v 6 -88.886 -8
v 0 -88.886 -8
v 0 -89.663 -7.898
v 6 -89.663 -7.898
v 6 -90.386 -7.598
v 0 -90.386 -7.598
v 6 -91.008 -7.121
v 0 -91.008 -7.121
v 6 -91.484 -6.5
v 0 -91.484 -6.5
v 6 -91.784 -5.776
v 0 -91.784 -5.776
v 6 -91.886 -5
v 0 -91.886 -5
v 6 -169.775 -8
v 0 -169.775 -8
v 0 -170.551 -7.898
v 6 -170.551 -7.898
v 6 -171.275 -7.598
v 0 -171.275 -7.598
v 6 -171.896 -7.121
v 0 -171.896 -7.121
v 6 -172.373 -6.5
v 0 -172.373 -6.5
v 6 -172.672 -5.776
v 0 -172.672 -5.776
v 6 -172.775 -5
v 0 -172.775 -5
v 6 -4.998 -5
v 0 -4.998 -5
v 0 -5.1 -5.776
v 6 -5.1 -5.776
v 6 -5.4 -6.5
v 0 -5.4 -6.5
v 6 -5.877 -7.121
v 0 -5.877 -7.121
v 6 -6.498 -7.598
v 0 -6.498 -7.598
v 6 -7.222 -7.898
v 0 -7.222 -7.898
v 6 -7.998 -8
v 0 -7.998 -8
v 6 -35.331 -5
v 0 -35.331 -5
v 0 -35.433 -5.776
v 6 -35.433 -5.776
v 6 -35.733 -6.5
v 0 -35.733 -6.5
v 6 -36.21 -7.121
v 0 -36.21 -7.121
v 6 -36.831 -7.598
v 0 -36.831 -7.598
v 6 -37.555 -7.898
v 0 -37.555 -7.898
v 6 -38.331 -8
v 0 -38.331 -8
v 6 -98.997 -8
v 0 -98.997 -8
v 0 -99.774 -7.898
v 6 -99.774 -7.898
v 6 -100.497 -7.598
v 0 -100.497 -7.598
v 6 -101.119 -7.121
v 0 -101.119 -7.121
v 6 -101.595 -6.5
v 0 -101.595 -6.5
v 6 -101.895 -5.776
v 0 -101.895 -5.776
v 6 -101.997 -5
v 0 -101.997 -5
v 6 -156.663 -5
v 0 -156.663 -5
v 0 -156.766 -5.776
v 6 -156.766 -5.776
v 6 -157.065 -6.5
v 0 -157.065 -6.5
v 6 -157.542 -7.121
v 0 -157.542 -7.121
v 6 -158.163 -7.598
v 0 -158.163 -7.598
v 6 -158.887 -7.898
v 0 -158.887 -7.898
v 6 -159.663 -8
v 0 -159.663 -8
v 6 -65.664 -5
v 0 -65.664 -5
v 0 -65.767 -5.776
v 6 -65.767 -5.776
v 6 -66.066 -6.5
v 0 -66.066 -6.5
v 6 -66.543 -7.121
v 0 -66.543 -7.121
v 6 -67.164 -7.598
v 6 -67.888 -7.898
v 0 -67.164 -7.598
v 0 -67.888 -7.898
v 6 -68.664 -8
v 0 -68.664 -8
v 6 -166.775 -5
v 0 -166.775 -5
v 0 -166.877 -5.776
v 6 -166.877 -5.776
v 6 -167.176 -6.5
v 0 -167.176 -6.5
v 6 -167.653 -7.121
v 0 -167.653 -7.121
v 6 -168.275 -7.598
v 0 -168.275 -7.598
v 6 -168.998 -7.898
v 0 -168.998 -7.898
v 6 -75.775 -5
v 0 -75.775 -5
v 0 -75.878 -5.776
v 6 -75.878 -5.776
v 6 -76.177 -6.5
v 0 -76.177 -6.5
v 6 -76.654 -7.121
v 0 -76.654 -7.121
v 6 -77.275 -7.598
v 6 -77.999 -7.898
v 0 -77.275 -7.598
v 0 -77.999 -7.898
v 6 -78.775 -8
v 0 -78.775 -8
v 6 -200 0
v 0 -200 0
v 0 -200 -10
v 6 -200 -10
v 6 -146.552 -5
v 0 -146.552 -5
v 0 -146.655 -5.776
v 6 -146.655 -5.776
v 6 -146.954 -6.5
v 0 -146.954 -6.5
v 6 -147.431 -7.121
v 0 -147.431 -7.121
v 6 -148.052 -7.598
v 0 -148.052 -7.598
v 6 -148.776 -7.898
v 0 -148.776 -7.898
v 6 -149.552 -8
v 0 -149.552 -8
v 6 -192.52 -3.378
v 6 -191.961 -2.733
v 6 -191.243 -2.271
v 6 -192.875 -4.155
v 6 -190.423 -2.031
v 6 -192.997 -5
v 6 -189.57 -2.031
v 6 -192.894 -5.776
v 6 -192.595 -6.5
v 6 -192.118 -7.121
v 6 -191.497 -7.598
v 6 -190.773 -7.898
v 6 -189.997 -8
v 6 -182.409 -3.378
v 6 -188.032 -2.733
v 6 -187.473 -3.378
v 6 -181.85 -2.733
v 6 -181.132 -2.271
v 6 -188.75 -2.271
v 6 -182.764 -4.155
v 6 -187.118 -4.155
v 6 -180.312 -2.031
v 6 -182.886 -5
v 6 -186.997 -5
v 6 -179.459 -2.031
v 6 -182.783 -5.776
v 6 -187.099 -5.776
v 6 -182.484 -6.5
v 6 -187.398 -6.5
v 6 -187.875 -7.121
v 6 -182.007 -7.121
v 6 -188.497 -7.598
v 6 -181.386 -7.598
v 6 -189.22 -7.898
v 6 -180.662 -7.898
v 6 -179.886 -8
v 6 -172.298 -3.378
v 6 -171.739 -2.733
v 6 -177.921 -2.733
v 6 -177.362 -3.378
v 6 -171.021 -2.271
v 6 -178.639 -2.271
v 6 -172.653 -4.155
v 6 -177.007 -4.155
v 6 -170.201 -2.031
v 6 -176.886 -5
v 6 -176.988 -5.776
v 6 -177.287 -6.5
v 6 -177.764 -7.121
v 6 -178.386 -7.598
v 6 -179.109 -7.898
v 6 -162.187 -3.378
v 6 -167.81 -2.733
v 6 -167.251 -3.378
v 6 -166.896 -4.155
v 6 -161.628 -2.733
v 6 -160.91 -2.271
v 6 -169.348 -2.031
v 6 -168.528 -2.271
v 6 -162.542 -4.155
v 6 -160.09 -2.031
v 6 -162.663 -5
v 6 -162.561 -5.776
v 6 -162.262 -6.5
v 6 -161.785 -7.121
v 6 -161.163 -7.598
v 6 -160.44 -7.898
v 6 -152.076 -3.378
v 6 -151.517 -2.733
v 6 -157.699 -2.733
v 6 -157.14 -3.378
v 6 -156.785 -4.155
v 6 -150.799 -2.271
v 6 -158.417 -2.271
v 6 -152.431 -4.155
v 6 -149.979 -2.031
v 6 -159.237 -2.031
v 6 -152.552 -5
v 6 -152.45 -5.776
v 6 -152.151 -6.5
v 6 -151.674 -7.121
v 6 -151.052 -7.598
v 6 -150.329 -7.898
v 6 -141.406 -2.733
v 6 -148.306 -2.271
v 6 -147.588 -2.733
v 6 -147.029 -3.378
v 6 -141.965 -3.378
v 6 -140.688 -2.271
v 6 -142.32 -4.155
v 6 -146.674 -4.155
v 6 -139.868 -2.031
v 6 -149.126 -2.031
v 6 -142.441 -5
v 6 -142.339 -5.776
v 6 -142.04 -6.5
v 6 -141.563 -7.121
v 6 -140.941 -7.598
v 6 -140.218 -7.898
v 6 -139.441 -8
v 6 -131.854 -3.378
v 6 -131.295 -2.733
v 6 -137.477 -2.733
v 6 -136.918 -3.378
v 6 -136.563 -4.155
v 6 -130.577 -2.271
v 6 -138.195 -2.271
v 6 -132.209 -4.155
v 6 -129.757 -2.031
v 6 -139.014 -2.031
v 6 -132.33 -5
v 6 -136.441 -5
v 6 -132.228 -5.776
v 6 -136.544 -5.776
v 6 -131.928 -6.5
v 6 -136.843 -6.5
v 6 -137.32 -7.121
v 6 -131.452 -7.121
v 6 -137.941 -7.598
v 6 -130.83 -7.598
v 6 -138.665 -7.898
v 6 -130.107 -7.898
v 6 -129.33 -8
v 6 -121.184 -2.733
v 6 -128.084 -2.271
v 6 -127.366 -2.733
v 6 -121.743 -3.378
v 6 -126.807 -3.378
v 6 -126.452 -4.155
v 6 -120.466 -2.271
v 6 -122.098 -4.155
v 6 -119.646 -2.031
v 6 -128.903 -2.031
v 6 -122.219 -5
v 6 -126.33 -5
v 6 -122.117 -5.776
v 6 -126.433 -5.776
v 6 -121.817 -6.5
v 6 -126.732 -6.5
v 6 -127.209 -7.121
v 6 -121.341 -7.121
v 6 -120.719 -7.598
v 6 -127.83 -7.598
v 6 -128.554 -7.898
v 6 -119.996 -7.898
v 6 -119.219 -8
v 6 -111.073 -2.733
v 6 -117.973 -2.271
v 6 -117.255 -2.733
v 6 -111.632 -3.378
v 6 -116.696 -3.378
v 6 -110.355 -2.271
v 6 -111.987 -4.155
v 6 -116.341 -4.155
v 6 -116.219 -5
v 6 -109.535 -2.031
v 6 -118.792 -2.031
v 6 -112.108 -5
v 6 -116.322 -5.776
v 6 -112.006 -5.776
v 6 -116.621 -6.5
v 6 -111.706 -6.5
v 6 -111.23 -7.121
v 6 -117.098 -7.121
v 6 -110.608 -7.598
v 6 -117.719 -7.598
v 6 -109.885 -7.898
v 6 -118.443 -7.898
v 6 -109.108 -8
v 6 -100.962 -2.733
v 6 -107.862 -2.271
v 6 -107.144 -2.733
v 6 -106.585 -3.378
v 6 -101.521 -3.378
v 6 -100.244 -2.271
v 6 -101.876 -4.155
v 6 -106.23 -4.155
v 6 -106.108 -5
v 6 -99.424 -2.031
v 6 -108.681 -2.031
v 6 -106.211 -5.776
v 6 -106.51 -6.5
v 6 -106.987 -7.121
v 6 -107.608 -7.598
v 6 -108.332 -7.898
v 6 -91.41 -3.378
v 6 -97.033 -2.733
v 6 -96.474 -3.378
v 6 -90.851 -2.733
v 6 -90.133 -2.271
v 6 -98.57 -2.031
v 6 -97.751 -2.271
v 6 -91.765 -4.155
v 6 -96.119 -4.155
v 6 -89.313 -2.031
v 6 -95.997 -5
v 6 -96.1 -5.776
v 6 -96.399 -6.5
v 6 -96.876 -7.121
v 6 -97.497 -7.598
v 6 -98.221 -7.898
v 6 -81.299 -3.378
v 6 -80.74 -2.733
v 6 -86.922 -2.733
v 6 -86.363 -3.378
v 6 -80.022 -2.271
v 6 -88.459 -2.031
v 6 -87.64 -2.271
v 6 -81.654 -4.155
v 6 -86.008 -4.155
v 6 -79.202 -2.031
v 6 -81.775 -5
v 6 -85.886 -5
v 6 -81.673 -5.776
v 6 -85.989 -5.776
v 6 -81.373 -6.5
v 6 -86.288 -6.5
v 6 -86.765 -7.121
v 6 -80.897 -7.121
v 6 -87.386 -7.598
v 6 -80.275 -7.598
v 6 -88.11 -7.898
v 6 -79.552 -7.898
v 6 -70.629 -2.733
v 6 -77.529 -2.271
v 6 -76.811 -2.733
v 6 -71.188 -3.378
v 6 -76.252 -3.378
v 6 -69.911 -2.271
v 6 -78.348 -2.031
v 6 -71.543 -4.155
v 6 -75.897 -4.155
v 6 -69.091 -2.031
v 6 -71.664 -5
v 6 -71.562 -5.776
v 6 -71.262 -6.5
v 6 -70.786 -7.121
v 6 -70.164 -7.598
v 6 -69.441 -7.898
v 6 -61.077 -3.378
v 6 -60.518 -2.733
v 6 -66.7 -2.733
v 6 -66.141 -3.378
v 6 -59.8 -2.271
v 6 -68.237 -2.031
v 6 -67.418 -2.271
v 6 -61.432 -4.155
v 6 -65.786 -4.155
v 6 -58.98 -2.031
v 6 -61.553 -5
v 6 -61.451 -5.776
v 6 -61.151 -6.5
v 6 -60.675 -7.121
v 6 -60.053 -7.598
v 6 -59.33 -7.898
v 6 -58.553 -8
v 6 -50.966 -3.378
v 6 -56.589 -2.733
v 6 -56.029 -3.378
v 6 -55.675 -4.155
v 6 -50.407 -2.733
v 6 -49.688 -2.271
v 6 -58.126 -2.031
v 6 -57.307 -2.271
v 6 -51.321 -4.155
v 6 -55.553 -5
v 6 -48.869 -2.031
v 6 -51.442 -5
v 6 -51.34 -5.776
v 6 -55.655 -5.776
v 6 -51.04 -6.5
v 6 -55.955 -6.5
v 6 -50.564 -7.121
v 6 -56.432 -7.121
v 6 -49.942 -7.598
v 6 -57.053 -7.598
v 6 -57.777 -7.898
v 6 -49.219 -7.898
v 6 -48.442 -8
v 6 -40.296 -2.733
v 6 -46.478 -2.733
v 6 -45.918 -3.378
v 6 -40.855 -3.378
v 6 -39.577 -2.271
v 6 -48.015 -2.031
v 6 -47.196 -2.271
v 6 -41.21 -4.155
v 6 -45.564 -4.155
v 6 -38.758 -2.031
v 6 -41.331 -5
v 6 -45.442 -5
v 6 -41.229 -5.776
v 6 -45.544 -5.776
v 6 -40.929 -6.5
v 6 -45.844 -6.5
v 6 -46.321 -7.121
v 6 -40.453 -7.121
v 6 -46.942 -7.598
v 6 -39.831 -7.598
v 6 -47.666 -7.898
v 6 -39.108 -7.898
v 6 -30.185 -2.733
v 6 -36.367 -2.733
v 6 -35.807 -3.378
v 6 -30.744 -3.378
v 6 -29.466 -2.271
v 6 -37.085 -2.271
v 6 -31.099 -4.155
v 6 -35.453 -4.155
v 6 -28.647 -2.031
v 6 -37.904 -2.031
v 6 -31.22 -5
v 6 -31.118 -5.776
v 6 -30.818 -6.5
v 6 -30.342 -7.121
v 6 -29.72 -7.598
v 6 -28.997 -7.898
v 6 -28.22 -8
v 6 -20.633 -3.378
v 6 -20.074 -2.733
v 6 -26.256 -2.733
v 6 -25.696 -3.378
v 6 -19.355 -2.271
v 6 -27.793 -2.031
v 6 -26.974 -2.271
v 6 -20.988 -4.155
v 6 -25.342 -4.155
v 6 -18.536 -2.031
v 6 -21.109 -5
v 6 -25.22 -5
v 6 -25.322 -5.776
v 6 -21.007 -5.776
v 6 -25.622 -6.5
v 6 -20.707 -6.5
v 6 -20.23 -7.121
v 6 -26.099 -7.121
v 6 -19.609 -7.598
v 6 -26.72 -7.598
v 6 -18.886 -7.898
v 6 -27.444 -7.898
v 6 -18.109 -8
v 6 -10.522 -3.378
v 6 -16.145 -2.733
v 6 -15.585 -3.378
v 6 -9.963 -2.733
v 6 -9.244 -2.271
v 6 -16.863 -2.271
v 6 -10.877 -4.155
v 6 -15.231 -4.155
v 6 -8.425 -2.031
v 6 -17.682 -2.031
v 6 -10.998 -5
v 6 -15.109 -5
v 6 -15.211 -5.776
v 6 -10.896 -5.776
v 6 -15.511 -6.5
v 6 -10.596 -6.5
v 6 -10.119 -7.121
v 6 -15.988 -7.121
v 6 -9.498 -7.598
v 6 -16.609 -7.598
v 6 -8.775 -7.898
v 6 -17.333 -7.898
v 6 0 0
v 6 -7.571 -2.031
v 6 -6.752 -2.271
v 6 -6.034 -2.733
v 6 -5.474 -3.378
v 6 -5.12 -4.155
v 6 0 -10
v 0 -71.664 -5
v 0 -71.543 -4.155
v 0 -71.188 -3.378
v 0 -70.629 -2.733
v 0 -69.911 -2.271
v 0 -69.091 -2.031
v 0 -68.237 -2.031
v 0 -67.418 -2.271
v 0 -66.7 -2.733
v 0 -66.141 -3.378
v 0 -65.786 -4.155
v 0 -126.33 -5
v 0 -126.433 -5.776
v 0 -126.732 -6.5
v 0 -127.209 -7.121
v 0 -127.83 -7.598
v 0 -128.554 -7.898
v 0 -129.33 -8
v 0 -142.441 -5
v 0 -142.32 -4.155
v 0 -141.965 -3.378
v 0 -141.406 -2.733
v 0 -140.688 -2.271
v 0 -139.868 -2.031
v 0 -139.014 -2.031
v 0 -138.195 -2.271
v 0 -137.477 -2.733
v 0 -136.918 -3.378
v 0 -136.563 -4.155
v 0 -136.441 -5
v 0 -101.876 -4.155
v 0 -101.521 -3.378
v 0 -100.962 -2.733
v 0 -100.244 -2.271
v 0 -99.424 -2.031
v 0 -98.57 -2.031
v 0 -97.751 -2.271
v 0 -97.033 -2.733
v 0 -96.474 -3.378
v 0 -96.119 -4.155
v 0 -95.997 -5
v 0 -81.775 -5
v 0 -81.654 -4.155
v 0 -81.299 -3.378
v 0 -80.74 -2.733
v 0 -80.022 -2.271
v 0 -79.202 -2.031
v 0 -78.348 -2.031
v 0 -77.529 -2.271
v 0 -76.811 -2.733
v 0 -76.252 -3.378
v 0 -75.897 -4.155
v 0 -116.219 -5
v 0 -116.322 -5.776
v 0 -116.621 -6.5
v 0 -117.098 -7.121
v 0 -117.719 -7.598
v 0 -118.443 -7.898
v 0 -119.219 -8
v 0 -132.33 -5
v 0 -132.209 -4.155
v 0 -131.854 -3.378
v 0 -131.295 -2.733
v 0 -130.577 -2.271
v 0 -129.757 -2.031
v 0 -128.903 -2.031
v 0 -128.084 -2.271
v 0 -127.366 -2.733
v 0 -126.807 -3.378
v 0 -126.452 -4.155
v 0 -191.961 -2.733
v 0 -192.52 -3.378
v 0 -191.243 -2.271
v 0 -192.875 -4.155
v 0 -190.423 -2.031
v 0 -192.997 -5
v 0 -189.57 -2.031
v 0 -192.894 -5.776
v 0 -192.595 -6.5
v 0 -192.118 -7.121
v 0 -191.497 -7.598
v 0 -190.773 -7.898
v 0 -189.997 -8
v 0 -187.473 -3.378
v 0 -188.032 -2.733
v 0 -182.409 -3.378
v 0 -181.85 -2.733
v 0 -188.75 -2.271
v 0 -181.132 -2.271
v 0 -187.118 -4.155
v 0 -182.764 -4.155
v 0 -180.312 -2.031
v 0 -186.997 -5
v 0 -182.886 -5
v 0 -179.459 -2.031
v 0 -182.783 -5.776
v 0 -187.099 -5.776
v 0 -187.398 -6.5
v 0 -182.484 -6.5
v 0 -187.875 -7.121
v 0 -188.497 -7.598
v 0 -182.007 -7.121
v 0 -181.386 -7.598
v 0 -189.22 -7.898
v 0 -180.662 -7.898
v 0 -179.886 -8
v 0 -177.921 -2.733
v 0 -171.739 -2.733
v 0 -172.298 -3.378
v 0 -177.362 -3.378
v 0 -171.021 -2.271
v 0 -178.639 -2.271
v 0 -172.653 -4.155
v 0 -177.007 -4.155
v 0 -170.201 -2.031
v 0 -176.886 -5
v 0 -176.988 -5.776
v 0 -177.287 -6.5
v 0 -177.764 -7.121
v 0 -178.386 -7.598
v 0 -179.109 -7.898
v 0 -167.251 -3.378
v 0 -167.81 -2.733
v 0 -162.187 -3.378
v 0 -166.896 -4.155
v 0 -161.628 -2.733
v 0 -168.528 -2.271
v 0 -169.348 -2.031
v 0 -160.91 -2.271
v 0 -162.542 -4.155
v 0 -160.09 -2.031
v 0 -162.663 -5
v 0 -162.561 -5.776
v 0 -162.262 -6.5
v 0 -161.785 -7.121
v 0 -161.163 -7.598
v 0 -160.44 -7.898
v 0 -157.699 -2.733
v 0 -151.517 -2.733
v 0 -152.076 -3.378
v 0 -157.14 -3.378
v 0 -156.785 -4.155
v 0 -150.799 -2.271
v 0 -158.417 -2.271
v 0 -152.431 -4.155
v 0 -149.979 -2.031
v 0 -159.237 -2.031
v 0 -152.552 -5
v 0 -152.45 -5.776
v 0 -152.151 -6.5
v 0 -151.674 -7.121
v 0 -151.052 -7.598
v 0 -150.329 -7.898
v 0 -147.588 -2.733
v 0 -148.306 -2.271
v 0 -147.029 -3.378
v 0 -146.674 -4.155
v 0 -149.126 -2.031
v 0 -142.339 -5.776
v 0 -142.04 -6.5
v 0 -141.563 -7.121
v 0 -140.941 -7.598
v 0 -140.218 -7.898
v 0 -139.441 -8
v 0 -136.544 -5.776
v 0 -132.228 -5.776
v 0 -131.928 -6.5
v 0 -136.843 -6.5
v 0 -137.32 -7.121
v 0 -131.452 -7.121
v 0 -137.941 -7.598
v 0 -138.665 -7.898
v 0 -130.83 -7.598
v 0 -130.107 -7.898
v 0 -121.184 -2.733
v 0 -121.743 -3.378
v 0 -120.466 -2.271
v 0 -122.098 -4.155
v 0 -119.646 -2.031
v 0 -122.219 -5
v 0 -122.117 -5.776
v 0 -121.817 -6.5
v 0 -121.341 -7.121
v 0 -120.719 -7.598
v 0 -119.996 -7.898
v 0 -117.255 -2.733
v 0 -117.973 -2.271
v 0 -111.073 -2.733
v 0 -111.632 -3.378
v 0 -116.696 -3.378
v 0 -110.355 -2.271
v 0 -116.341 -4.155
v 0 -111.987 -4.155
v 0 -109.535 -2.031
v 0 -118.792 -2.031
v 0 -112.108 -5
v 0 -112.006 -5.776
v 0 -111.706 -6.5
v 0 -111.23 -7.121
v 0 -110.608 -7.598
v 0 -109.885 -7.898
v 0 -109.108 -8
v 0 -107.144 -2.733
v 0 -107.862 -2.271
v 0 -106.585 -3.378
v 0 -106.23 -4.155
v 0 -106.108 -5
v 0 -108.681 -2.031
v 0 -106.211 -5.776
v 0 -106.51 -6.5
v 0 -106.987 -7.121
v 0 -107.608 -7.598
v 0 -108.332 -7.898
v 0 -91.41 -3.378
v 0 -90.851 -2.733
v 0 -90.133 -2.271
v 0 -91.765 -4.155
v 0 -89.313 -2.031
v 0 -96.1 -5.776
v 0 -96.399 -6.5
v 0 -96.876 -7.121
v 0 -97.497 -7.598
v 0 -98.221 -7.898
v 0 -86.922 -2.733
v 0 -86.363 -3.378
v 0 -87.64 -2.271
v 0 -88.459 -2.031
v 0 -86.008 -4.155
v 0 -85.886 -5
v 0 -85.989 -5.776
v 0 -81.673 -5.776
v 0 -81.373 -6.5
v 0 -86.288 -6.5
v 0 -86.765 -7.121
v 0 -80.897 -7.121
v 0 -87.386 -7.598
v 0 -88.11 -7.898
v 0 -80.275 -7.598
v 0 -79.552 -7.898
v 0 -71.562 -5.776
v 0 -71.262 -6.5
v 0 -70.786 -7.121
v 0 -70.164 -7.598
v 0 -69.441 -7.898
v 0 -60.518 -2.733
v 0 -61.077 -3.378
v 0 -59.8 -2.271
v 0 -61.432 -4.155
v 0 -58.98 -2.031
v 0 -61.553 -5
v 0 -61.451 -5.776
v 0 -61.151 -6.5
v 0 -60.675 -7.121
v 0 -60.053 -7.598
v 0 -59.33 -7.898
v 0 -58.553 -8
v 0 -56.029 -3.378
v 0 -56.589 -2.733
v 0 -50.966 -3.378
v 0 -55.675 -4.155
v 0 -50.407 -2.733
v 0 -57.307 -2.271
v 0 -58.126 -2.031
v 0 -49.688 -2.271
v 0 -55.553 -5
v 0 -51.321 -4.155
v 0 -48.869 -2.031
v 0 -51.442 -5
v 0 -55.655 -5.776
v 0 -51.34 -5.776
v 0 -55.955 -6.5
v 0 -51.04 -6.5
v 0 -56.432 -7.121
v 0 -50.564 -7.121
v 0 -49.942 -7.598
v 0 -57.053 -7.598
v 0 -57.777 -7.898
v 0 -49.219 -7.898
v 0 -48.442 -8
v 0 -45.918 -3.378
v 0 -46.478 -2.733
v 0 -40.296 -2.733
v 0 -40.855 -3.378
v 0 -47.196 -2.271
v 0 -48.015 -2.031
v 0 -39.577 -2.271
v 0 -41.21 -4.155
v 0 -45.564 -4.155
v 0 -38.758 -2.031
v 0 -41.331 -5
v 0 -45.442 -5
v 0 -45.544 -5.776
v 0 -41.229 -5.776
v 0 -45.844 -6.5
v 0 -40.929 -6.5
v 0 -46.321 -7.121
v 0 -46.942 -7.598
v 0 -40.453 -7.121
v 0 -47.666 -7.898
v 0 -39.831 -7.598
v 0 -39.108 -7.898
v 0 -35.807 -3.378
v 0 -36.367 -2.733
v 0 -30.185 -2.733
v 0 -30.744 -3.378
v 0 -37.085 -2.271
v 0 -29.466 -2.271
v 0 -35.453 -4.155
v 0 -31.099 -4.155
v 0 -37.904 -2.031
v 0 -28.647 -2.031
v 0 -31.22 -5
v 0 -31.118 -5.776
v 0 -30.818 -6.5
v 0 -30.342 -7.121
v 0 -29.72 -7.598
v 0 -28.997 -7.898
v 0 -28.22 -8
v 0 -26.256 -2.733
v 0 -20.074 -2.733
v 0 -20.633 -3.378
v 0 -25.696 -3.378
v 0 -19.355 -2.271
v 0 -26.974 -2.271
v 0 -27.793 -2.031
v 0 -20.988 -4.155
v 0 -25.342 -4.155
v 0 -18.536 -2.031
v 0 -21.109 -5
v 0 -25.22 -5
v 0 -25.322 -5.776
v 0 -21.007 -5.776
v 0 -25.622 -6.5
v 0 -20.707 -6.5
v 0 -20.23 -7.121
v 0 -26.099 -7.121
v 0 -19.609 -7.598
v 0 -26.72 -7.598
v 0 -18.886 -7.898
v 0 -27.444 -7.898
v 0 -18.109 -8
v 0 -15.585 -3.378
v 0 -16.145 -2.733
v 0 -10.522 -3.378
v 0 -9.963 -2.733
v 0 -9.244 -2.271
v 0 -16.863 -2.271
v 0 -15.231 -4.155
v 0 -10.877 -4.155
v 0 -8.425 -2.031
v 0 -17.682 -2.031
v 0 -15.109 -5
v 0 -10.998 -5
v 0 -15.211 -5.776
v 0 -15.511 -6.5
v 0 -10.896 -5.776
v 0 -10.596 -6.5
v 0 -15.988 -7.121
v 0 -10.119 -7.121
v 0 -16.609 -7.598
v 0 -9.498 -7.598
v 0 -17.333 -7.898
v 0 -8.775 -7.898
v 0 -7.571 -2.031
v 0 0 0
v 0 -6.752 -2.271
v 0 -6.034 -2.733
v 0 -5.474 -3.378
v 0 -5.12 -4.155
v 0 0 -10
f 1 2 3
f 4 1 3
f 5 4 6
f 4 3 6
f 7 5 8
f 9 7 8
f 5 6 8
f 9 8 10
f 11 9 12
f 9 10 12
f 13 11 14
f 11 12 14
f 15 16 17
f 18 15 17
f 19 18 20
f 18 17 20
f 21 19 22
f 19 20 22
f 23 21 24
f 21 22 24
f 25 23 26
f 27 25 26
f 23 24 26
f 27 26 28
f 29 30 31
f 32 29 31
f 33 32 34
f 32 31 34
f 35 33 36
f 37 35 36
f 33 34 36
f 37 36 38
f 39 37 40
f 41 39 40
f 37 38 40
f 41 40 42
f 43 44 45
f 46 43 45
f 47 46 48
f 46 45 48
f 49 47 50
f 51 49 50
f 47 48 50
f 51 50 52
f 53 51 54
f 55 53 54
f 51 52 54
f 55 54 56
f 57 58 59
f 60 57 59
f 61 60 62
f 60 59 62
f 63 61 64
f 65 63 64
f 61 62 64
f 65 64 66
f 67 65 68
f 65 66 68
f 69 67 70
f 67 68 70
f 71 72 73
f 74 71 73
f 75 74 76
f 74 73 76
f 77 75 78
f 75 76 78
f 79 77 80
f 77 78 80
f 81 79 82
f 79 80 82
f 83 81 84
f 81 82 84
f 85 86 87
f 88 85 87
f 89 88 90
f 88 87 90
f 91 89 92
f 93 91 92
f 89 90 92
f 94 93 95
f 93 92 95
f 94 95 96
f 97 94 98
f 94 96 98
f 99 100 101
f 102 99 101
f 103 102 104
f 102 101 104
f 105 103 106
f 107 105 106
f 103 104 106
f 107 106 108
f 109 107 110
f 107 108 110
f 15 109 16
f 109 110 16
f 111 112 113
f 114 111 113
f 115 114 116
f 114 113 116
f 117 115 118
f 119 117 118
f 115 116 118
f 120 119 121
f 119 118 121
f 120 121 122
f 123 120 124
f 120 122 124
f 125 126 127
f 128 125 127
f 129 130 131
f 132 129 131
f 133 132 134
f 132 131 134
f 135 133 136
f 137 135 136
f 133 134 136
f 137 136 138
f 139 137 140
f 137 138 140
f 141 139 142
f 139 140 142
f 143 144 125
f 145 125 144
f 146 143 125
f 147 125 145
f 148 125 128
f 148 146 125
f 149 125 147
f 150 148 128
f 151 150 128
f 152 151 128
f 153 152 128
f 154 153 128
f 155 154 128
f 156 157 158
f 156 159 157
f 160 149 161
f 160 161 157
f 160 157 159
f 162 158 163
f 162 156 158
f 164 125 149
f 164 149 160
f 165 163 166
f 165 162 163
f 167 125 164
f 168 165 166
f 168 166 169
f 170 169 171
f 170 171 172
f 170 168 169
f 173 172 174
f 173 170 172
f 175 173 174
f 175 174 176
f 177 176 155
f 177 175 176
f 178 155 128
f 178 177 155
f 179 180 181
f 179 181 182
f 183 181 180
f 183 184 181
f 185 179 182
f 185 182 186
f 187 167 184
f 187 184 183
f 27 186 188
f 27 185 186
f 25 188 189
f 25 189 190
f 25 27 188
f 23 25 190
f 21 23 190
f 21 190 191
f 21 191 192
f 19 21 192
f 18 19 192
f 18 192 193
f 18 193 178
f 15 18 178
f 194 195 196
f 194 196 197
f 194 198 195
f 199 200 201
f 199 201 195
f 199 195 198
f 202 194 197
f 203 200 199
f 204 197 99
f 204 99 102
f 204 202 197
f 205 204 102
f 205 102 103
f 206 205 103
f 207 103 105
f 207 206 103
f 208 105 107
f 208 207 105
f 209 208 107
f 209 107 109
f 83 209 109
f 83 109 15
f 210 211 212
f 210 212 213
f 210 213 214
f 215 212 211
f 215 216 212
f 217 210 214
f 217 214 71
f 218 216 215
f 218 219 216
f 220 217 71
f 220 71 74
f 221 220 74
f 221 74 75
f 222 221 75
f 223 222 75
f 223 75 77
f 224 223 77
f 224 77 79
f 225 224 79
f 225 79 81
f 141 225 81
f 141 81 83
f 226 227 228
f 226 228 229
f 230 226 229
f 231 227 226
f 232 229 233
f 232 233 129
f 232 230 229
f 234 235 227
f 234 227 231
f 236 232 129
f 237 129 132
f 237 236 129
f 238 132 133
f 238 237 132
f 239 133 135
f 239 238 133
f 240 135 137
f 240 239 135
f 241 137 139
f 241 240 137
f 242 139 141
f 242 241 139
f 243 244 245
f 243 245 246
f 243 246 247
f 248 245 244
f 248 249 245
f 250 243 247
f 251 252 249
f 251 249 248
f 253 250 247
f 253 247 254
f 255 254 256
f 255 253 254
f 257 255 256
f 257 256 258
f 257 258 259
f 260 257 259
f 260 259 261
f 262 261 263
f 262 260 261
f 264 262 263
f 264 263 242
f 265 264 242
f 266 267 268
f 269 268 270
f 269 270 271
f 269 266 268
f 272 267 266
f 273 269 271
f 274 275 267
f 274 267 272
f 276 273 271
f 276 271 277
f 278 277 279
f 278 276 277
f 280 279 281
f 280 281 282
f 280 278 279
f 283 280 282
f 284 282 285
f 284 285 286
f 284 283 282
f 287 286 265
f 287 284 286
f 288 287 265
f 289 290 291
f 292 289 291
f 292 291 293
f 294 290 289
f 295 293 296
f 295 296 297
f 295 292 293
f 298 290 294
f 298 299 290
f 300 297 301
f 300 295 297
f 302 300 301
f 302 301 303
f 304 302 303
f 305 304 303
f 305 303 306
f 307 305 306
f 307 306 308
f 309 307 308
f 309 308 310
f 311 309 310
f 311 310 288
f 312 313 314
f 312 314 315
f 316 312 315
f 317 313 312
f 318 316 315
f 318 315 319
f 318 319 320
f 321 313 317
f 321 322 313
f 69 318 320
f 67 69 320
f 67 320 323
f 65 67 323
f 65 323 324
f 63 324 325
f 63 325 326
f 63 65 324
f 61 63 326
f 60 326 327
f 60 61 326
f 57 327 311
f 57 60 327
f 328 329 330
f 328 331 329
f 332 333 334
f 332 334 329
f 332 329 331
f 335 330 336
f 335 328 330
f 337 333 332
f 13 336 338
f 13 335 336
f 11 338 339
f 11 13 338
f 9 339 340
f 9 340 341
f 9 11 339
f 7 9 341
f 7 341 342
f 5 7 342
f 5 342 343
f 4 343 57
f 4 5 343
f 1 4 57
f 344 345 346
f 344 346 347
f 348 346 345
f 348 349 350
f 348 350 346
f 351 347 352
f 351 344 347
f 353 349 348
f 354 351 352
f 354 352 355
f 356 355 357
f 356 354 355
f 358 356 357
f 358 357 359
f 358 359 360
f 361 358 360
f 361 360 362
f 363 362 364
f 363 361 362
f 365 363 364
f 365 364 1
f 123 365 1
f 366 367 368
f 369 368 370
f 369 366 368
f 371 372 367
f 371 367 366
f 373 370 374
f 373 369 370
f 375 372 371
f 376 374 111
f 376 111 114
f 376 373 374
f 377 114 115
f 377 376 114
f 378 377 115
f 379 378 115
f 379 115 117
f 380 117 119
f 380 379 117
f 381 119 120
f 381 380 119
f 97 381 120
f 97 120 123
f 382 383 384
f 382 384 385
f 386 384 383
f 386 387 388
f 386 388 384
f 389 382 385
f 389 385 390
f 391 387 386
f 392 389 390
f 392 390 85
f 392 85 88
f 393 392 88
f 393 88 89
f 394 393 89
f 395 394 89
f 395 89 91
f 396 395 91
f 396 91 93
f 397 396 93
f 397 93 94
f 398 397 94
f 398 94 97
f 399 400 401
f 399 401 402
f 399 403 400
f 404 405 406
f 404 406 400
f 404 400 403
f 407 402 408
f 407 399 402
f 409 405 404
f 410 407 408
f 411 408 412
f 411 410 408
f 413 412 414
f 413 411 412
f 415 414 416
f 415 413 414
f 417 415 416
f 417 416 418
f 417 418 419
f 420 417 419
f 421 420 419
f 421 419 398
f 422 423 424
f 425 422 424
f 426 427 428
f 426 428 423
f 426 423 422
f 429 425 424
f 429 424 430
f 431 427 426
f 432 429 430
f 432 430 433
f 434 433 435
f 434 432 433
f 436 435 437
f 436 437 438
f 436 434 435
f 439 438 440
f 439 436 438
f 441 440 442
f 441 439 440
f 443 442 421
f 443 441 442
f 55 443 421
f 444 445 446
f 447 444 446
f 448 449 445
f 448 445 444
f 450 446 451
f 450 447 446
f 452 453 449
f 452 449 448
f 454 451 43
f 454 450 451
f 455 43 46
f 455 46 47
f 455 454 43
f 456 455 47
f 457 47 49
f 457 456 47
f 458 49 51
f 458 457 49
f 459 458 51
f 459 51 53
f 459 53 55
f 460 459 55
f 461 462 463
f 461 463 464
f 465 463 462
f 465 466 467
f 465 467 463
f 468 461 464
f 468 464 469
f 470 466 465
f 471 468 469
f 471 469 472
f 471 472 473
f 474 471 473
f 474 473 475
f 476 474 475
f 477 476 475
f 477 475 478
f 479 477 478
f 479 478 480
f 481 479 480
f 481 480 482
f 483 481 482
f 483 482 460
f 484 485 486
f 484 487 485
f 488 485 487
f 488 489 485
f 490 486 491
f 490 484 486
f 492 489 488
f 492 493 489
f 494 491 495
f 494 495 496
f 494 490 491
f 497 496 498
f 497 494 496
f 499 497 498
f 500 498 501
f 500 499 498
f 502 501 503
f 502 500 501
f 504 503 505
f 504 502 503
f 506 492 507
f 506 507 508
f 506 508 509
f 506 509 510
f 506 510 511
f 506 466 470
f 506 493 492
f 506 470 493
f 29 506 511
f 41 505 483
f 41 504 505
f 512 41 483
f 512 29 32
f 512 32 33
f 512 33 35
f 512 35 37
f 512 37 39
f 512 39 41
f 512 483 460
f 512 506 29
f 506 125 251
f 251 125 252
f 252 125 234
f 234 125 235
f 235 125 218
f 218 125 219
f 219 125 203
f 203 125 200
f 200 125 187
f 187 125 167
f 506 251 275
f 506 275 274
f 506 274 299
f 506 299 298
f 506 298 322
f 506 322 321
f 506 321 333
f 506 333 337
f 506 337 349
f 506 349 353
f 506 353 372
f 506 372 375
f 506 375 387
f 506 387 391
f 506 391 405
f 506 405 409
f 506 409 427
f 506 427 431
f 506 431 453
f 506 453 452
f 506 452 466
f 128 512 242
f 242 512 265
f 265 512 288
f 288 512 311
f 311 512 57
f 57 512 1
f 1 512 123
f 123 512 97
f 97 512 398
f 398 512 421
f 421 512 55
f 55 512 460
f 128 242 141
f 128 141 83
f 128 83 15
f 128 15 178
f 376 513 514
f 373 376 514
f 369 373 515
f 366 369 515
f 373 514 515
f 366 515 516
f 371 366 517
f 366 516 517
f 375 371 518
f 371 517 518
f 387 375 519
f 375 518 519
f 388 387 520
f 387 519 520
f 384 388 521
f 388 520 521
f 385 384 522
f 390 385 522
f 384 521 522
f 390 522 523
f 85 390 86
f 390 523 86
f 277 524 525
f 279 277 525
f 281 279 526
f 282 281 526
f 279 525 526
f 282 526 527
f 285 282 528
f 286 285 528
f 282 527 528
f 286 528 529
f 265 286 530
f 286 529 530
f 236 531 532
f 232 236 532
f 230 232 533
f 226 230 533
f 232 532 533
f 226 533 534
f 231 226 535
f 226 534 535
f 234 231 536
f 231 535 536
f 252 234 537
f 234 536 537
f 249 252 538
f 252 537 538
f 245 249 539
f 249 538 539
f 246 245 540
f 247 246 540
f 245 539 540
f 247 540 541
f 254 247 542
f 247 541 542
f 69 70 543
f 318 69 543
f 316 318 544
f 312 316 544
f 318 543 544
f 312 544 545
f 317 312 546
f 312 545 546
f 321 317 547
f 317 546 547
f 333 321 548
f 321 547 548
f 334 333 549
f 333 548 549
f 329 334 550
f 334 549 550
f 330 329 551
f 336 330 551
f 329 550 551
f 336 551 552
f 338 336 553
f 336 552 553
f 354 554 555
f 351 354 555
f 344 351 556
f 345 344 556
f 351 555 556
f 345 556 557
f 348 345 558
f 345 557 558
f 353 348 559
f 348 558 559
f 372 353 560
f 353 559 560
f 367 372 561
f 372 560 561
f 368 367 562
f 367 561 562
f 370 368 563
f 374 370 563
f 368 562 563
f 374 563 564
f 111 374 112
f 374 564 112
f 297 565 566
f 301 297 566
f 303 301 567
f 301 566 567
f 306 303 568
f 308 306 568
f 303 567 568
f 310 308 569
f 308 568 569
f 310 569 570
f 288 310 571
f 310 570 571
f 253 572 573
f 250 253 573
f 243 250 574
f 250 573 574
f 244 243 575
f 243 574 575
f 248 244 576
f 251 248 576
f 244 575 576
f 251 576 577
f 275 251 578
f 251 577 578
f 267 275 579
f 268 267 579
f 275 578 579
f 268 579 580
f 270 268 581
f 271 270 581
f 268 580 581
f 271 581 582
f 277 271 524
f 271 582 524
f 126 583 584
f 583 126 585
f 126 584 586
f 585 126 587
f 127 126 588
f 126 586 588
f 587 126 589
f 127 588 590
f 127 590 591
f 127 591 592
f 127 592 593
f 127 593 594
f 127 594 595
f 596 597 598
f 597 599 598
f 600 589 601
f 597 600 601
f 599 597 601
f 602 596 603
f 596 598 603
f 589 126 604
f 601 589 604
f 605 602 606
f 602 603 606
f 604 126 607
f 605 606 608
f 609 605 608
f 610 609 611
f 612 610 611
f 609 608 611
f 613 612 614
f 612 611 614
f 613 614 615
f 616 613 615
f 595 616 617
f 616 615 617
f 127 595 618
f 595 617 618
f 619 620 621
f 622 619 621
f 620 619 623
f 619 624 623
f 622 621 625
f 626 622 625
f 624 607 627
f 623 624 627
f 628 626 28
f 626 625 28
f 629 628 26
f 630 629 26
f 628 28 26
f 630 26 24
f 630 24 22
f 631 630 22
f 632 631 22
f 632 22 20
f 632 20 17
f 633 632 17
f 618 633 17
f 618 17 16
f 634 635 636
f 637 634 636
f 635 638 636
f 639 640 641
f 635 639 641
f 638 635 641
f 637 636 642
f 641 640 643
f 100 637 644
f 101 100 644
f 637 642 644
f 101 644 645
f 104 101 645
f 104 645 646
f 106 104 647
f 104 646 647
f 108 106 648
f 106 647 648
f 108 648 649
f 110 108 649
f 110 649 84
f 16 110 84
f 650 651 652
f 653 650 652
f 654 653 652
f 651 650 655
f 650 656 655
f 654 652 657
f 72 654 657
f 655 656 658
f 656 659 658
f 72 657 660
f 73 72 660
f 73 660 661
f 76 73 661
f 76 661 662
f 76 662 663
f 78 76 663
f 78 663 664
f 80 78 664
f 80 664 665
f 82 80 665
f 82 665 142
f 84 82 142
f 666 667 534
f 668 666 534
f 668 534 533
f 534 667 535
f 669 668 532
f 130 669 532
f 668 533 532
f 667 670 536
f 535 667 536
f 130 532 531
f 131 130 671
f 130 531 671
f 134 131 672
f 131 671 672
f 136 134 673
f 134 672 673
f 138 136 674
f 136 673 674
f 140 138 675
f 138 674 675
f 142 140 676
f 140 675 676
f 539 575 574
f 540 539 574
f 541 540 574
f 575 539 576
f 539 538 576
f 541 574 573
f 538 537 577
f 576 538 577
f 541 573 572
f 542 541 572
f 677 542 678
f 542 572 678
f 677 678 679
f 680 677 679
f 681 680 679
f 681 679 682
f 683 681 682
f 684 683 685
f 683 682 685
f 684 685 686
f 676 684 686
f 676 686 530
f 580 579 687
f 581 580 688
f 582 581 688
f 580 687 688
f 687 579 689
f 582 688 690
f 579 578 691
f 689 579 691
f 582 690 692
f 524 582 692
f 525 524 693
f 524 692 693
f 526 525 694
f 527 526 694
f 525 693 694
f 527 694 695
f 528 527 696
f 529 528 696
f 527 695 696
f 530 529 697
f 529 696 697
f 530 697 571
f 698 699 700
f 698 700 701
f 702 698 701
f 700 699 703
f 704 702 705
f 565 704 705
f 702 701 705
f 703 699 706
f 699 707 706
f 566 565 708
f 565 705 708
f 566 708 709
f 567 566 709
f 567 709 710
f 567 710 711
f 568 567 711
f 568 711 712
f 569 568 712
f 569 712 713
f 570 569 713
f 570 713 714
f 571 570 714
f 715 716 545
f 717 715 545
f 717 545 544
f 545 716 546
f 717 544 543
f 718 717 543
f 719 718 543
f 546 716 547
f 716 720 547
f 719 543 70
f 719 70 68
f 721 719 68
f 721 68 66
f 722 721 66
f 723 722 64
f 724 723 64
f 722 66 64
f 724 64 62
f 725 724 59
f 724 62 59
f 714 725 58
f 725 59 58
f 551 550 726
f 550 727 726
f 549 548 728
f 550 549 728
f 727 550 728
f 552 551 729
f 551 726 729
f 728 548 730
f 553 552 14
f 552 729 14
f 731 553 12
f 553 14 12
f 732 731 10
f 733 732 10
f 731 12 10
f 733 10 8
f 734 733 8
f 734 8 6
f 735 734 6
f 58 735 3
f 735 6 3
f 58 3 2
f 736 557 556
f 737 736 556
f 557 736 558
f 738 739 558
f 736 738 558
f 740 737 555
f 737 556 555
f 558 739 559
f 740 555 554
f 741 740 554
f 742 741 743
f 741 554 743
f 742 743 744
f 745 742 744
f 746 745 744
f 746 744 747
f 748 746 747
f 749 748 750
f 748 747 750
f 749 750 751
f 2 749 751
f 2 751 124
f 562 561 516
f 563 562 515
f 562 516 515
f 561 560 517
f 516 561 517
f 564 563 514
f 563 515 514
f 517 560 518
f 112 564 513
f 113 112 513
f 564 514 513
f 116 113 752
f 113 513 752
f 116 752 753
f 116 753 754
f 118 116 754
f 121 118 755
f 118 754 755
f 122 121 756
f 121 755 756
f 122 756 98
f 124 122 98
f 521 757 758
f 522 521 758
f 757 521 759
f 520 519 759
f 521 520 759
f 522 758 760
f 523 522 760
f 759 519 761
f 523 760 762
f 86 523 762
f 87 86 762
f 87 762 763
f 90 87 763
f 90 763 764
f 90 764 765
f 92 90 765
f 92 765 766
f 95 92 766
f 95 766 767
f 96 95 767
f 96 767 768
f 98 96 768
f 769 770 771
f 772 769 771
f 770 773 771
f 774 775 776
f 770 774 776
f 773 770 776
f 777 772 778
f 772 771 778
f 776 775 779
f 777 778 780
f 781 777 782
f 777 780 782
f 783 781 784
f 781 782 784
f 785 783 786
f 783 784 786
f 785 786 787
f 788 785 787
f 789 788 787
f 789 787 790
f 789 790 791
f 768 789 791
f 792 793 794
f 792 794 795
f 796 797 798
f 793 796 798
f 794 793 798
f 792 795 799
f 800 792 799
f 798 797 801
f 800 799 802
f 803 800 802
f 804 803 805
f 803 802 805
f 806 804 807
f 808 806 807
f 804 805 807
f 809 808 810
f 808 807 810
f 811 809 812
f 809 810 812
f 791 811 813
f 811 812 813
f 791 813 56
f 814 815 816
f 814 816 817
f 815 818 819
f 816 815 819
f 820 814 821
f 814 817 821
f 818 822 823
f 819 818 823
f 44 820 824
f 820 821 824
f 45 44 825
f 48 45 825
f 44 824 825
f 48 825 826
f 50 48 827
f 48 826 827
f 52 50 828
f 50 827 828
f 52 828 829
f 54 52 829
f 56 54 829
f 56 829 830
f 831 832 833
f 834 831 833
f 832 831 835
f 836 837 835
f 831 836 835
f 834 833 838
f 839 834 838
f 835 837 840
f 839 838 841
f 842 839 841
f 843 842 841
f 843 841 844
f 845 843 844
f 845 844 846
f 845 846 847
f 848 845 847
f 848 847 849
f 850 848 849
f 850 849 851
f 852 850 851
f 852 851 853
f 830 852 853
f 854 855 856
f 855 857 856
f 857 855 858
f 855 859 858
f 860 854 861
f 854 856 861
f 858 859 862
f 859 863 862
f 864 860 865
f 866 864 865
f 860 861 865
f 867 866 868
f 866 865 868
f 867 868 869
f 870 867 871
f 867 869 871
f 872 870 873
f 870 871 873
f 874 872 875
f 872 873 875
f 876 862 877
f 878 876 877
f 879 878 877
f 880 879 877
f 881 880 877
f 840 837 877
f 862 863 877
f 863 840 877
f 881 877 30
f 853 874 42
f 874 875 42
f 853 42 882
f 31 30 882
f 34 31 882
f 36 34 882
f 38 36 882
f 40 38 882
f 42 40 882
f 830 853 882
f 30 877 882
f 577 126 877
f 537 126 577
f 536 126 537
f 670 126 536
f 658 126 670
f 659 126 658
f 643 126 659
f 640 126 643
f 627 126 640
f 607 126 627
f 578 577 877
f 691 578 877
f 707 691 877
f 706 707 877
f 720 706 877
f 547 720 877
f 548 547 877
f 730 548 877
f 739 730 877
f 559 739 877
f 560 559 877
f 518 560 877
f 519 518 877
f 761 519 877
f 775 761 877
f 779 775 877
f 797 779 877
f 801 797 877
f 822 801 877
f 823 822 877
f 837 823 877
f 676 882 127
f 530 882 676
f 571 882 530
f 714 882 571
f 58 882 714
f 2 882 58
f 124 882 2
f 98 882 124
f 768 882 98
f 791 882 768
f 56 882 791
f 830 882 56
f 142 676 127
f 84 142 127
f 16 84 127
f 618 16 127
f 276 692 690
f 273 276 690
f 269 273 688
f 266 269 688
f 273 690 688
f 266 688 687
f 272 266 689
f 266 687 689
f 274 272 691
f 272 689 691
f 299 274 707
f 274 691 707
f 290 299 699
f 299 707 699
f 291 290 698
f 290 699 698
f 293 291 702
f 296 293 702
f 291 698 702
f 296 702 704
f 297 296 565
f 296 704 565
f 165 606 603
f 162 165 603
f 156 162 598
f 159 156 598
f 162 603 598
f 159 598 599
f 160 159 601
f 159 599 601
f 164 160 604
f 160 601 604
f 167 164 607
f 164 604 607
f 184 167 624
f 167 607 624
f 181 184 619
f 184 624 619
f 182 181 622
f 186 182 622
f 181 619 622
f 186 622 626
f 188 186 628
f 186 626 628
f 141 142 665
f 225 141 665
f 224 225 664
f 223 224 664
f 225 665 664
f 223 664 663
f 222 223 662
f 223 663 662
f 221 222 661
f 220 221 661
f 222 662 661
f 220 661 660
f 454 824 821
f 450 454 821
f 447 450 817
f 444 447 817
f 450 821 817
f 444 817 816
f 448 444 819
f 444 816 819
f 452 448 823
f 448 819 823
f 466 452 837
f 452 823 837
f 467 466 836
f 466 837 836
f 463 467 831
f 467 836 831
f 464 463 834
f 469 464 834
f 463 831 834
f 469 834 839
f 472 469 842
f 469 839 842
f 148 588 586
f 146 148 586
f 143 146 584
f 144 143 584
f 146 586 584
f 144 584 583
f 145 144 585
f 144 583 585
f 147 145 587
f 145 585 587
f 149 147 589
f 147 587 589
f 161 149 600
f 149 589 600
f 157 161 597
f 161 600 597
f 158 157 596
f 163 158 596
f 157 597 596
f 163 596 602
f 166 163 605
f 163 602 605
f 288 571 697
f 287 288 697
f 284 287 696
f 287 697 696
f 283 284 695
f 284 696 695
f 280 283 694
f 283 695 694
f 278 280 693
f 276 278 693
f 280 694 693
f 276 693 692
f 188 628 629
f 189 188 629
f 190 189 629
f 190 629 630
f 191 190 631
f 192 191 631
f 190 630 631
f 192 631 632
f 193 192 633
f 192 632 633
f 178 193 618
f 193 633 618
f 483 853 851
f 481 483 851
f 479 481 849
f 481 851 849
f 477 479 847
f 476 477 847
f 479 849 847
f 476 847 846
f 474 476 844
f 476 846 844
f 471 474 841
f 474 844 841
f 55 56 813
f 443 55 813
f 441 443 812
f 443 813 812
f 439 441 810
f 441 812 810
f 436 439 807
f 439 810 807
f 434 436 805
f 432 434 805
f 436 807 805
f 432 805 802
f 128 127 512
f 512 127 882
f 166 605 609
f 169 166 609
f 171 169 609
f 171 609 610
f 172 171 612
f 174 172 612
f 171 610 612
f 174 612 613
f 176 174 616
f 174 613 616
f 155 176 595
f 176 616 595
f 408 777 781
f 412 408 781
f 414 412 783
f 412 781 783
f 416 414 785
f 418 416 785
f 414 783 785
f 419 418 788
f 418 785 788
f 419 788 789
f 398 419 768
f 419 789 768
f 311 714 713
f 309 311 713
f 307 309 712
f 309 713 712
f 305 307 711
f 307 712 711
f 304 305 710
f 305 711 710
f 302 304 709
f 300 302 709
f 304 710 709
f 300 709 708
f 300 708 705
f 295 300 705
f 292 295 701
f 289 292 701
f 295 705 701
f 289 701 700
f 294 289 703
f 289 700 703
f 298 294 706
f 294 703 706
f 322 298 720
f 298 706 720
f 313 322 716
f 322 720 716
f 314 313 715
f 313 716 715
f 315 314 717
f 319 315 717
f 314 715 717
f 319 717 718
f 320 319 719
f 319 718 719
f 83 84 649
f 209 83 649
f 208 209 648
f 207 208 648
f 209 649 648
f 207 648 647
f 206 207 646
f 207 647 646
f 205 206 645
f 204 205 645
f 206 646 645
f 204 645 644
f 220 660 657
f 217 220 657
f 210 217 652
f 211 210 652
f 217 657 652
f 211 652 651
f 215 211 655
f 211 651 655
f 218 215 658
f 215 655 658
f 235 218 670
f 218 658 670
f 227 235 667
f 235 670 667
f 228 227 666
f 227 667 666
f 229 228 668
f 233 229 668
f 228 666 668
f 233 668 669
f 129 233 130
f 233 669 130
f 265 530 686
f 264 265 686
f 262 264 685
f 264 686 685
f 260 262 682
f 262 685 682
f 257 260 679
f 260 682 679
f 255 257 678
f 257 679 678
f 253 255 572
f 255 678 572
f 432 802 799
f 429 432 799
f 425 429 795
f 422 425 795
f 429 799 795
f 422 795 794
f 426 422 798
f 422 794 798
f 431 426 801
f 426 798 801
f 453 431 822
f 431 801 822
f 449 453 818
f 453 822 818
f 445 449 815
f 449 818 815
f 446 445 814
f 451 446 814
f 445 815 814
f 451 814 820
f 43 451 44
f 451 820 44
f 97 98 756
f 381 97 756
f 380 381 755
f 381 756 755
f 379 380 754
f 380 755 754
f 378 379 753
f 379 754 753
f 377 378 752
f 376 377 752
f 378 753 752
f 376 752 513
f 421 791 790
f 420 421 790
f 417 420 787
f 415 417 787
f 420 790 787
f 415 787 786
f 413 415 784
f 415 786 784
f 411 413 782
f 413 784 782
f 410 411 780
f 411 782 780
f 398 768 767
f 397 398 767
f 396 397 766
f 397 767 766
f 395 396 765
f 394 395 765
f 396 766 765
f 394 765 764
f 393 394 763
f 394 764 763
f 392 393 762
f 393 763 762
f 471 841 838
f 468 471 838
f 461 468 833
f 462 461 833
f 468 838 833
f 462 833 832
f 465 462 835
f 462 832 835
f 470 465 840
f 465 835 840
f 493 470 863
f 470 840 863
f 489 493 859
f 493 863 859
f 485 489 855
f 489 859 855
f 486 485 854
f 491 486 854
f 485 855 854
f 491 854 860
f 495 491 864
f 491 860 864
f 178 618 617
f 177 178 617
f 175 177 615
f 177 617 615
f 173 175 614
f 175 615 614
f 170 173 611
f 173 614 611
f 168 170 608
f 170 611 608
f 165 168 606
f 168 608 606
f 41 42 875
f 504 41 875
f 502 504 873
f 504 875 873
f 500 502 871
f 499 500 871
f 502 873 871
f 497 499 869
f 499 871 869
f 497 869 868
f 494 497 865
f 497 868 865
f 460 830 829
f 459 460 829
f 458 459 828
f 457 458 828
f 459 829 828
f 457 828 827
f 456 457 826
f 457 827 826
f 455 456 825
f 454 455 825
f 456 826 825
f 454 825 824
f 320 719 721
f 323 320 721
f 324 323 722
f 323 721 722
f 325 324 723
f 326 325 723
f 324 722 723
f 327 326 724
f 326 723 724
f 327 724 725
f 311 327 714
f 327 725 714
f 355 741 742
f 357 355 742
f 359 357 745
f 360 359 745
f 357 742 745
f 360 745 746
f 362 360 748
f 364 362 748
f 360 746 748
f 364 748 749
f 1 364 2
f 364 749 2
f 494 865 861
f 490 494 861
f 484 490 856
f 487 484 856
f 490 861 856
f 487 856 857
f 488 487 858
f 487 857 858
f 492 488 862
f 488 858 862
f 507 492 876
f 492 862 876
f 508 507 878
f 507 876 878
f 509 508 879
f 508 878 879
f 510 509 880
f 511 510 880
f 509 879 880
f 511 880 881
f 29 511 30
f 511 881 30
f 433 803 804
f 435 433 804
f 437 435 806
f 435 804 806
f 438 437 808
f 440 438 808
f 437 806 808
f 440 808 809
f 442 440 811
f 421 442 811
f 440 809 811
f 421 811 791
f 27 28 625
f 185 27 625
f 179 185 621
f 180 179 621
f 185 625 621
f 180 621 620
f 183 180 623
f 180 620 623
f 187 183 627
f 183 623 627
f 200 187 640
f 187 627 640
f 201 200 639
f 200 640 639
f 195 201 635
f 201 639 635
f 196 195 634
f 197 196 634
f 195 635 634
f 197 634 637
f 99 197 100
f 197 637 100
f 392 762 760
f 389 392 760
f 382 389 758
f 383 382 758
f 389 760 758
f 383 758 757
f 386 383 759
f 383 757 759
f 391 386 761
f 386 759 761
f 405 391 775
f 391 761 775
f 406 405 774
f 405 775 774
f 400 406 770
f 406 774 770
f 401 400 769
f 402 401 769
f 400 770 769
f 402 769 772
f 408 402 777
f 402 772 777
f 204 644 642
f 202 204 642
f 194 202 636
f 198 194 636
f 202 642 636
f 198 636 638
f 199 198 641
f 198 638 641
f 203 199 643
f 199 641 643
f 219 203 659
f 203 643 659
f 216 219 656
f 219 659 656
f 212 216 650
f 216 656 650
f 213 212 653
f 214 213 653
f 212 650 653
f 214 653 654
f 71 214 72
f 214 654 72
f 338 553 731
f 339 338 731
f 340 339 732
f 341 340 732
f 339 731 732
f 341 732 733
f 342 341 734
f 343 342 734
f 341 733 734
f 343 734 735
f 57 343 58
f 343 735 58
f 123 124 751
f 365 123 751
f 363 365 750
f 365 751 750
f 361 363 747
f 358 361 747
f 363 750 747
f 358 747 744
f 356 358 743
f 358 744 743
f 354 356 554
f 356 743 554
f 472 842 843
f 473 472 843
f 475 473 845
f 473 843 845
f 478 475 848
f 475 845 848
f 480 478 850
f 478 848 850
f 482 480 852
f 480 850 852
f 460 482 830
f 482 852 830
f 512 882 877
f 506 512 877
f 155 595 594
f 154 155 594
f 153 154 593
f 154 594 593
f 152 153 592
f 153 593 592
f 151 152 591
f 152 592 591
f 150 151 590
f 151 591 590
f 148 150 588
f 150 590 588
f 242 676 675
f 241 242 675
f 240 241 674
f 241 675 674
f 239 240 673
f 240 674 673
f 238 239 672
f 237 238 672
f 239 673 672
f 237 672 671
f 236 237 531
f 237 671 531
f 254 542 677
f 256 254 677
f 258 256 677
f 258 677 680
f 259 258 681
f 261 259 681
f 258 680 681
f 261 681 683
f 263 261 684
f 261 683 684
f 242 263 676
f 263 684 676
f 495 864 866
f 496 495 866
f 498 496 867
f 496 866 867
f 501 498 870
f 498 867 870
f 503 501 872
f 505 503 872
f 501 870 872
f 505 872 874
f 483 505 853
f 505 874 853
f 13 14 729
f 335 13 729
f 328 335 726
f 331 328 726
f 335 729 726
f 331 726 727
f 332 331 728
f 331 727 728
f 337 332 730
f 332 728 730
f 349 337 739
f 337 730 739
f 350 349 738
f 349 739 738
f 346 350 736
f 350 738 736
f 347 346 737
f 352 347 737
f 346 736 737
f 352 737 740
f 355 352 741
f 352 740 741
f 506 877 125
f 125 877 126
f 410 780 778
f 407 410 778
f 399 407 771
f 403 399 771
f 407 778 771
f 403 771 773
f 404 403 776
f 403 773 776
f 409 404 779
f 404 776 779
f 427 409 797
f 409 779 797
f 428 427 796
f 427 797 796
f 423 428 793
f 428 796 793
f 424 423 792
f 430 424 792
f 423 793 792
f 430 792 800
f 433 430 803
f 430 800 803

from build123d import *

# Parameters (mm, degrees)
EXTRUDE_1_DEPTH = 6


with BuildPart() as part:
    # 草图1 → 凸台-拉伸1 (new body)
    with BuildSketch(Plane(origin=(0, 0, 0), x_dir=(0, 0, -1), z_dir=(1, 0, 0))):
        with BuildLine():
            Line((5, -4.998144534), (5, 0))
            Line((5, 0), (0, 0))
            Line((0, 0), (0, -200))
            Line((0, -200), (5, -200))
            Line((5, -200), (5, -192.996545307))
            ThreePointArc((5, -192.996545307), (2, -189.996545307), (5, -186.996545307))
            Line((5, -186.996545307), (5, -182.885523042))
            ThreePointArc((5, -182.885523042), (2, -179.885523042), (5, -176.885523042))
            Line((5, -176.885523042), (5, -172.774500777))
            ThreePointArc((5, -172.774500777), (2, -169.774500777), (5, -166.774500777))
            Line((5, -166.774500777), (5, -162.663478512))
            ThreePointArc((5, -162.663478512), (2, -159.663478512), (5, -156.663478512))
            Line((5, -156.663478512), (5, -152.552456247))
            ThreePointArc((5, -152.552456247), (2, -149.552456247), (5, -146.552456247))
            Line((5, -146.552456247), (5, -142.441433981))
            ThreePointArc((5, -142.441433981), (2, -139.441433981), (5, -136.441433981))
            Line((5, -136.441433981), (5, -132.330411716))
            ThreePointArc((5, -132.330411716), (2, -129.330411716), (5, -126.330411716))
            Line((5, -126.330411716), (5, -122.219389451))
            ThreePointArc((5, -122.219389451), (2, -119.219389451), (5, -116.219389451))
            Line((5, -116.219389451), (5, -112.108367186))
            ThreePointArc((5, -112.108367186), (2, -109.108367186), (5, -106.108367186))
            Line((5, -106.108367186), (5, -101.99734492))
            ThreePointArc((5, -101.99734492), (2, -98.99734492), (5, -95.99734492))
            Line((5, -95.99734492), (5, -91.886322655))
            ThreePointArc((5, -91.886322655), (2, -88.886322655), (5, -85.886322655))
            Line((5, -85.886322655), (5, -81.77530039))
            ThreePointArc((5, -81.77530039), (2, -78.77530039), (5, -75.77530039))
            Line((5, -75.77530039), (5, -71.664278125))
            ThreePointArc((5, -71.664278125), (2, -68.664278125), (5, -65.664278125))
            Line((5, -65.664278125), (5, -61.55325586))
            ThreePointArc((5, -61.55325586), (2, -58.55325586), (5, -55.55325586))
            Line((5, -55.55325586), (5, -51.442233594))
            ThreePointArc((5, -51.442233594), (2, -48.442233594), (5, -45.442233594))
            Line((5, -45.442233594), (5, -41.331211329))
            ThreePointArc((5, -41.331211329), (2, -38.331211329), (5, -35.331211329))
            Line((5, -35.331211329), (5, -31.220189064))
            ThreePointArc((5, -31.220189064), (2, -28.220189064), (5, -25.220189064))
            Line((5, -25.220189064), (5, -21.109166799))
            ThreePointArc((5, -21.109166799), (2, -18.109166799), (5, -15.109166799))
            Line((5, -15.109166799), (5, -10.998144534))
            ThreePointArc((5, -10.998144534), (2, -7.998144534), (5, -4.998144534))
        make_face()
        with BuildLine():
            Line((10, 0), (5, 0))
            Line((5, 0), (5, -4.998144534))
            ThreePointArc((5, -4.998144534), (7.121320344, -5.87682419), (8, -7.998144534))
            ThreePointArc((8, -7.998144534), (7.121320344, -10.119464877), (5, -10.998144534))
            Line((5, -10.998144534), (5, -15.109166799))
            ThreePointArc((5, -15.109166799), (7.121320344, -15.987846455), (8, -18.109166799))
            ThreePointArc((8, -18.109166799), (7.121320344, -20.230487142), (5, -21.109166799))
            Line((5, -21.109166799), (5, -25.220189064))
            ThreePointArc((5, -25.220189064), (7.121320344, -26.09886872), (8, -28.220189064))
            ThreePointArc((8, -28.220189064), (7.121320344, -30.341509407), (5, -31.220189064))
            Line((5, -31.220189064), (5, -35.331211329))
            ThreePointArc((5, -35.331211329), (7.121320344, -36.209890986), (8, -38.331211329))
            ThreePointArc((8, -38.331211329), (7.121320344, -40.452531673), (5, -41.331211329))
            Line((5, -41.331211329), (5, -45.442233594))
            ThreePointArc((5, -45.442233594), (7.121320344, -46.320913251), (8, -48.442233594))
            ThreePointArc((8, -48.442233594), (7.121320344, -50.563553938), (5, -51.442233594))
            Line((5, -51.442233594), (5, -55.55325586))
            ThreePointArc((5, -55.55325586), (7.121320344, -56.431935516), (8, -58.55325586))
            ThreePointArc((8, -58.55325586), (7.121320344, -60.674576203), (5, -61.55325586))
            Line((5, -61.55325586), (5, -65.664278125))
            ThreePointArc((5, -65.664278125), (7.121320344, -66.542957781), (8, -68.664278125))
            ThreePointArc((8, -68.664278125), (7.121320344, -70.785598468), (5, -71.664278125))
            Line((5, -71.664278125), (5, -75.77530039))
            ThreePointArc((5, -75.77530039), (7.121320344, -76.653980046), (8, -78.77530039))
            ThreePointArc((8, -78.77530039), (7.121320344, -80.896620734), (5, -81.77530039))
            Line((5, -81.77530039), (5, -85.886322655))
            ThreePointArc((5, -85.886322655), (7.121320344, -86.765002312), (8, -88.886322655))
            ThreePointArc((8, -88.886322655), (7.121320344, -91.007642999), (5, -91.886322655))
            Line((5, -91.886322655), (5, -95.99734492))
            ThreePointArc((5, -95.99734492), (7.121320344, -96.876024577), (8, -98.99734492))
            ThreePointArc((8, -98.99734492), (7.121320344, -101.118665264), (5, -101.99734492))
            Line((5, -101.99734492), (5, -106.108367186))
            ThreePointArc((5, -106.108367186), (7.121320344, -106.987046842), (8, -109.108367186))
            ThreePointArc((8, -109.108367186), (7.121320344, -111.229687529), (5, -112.108367186))
            Line((5, -112.108367186), (5, -116.219389451))
            ThreePointArc((5, -116.219389451), (7.121320344, -117.098069107), (8, -119.219389451))
            ThreePointArc((8, -119.219389451), (7.121320344, -121.340709794), (5, -122.219389451))
            Line((5, -122.219389451), (5, -126.330411716))
            ThreePointArc((5, -126.330411716), (7.121320344, -127.209091373), (8, -129.330411716))
            ThreePointArc((8, -129.330411716), (7.121320344, -131.45173206), (5, -132.330411716))
            Line((5, -132.330411716), (5, -136.441433981))
            ThreePointArc((5, -136.441433981), (7.121320344, -137.320113638), (8, -139.441433981))
            ThreePointArc((8, -139.441433981), (7.121320344, -141.562754325), (5, -142.441433981))
            Line((5, -142.441433981), (5, -146.552456247))
            ThreePointArc((5, -146.552456247), (7.121320344, -147.431135903), (8, -149.552456247))
            ThreePointArc((8, -149.552456247), (7.121320344, -151.67377659), (5, -152.552456247))
            Line((5, -152.552456247), (5, -156.663478512))
            ThreePointArc((5, -156.663478512), (7.121320344, -157.542158168), (8, -159.663478512))
            ThreePointArc((8, -159.663478512), (7.121320344, -161.784798855), (5, -162.663478512))
            Line((5, -162.663478512), (5, -166.774500777))
            ThreePointArc((5, -166.774500777), (7.121320344, -167.653180433), (8, -169.774500777))
            ThreePointArc((8, -169.774500777), (7.121320344, -171.89582112), (5, -172.774500777))
            Line((5, -172.774500777), (5, -176.885523042))
            ThreePointArc((5, -176.885523042), (7.121320344, -177.764202699), (8, -179.885523042))
            ThreePointArc((8, -179.885523042), (7.121320344, -182.006843386), (5, -182.885523042))
            Line((5, -182.885523042), (5, -186.996545307))
            ThreePointArc((5, -186.996545307), (7.121320344, -187.875224964), (8, -189.996545307))
            ThreePointArc((8, -189.996545307), (7.121320344, -192.117865651), (5, -192.996545307))
            Line((5, -192.996545307), (5, -200))
            Line((5, -200), (10, -200))
            Line((10, -200), (10, 0))
        make_face()
    extrude(amount=EXTRUDE_1_DEPTH)


solid = part.part
